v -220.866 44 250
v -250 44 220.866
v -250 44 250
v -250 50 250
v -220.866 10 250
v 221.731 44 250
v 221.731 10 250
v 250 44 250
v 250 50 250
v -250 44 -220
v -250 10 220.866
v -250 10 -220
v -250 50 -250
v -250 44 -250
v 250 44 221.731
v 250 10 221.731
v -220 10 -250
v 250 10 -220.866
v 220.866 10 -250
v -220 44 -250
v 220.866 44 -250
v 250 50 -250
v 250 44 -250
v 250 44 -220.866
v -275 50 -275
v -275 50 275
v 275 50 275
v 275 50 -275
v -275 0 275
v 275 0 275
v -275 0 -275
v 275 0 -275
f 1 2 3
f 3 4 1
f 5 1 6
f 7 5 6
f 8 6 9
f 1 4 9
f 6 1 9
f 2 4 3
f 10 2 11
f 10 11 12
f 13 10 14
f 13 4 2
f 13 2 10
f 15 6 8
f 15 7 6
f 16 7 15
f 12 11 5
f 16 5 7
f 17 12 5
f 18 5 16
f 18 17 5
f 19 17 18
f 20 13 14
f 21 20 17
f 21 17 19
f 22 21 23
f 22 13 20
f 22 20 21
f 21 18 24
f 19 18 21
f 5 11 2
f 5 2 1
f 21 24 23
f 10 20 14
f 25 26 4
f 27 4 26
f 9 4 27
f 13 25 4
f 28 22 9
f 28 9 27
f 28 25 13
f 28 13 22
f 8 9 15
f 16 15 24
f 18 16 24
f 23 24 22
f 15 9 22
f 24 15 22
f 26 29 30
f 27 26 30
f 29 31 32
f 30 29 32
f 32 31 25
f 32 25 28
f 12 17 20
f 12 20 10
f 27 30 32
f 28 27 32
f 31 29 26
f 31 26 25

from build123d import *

# Parameters (mm, degrees)
SKETCH1_W           = 550
SKETCH1_H           = 550
BOSS_EXTRUDE1_DEPTH = 50
SKETCH2_W           = 500
SKETCH2_H           = 500
CUT_EXTRUDE1_DEPTH  = 40
BOSS_EXTRUDE2_DEPTH = 34
CIRPATTERN1_COUNT   = 4


with BuildPart() as part:
    # Sketch1 → Boss-Extrude1 (new body)
    with BuildSketch(Plane(origin=(0, 0, 0), x_dir=(1, 0, 0), z_dir=(0, 1, 0))):
        Rectangle(SKETCH1_W, SKETCH1_H)
    extrude(amount=BOSS_EXTRUDE1_DEPTH)

    # Sketch2 → Cut-Extrude1 (cut)
    with BuildSketch(Plane(origin=(0, 50, 0), x_dir=(1, 0, 0), z_dir=(0, 1, 0))):
        Rectangle(SKETCH2_W, SKETCH2_H)
    extrude(amount=-CUT_EXTRUDE1_DEPTH, mode=Mode.SUBTRACT)

    # Sketch3 → Boss-Extrude2 (add)
    with BuildSketch(Plane(origin=(0, 10, 0), x_dir=(1, 0, 0), z_dir=(0, 1, 0))):
        Polygon((-250, 250), (-220, 250), (-250, 220), align=None)
    boss_extrude2 = extrude(amount=BOSS_EXTRUDE2_DEPTH)

    # CirPattern1: Boss-Extrude2 ×4 about axis
    cirpattern1_axis = Axis((0.432779002, 0, 0.432779002), (0, 1, 0))
    for i in range(1, CIRPATTERN1_COUNT):
        add(boss_extrude2.rotate(cirpattern1_axis, i * 360 / CIRPATTERN1_COUNT))


solid = part.part
